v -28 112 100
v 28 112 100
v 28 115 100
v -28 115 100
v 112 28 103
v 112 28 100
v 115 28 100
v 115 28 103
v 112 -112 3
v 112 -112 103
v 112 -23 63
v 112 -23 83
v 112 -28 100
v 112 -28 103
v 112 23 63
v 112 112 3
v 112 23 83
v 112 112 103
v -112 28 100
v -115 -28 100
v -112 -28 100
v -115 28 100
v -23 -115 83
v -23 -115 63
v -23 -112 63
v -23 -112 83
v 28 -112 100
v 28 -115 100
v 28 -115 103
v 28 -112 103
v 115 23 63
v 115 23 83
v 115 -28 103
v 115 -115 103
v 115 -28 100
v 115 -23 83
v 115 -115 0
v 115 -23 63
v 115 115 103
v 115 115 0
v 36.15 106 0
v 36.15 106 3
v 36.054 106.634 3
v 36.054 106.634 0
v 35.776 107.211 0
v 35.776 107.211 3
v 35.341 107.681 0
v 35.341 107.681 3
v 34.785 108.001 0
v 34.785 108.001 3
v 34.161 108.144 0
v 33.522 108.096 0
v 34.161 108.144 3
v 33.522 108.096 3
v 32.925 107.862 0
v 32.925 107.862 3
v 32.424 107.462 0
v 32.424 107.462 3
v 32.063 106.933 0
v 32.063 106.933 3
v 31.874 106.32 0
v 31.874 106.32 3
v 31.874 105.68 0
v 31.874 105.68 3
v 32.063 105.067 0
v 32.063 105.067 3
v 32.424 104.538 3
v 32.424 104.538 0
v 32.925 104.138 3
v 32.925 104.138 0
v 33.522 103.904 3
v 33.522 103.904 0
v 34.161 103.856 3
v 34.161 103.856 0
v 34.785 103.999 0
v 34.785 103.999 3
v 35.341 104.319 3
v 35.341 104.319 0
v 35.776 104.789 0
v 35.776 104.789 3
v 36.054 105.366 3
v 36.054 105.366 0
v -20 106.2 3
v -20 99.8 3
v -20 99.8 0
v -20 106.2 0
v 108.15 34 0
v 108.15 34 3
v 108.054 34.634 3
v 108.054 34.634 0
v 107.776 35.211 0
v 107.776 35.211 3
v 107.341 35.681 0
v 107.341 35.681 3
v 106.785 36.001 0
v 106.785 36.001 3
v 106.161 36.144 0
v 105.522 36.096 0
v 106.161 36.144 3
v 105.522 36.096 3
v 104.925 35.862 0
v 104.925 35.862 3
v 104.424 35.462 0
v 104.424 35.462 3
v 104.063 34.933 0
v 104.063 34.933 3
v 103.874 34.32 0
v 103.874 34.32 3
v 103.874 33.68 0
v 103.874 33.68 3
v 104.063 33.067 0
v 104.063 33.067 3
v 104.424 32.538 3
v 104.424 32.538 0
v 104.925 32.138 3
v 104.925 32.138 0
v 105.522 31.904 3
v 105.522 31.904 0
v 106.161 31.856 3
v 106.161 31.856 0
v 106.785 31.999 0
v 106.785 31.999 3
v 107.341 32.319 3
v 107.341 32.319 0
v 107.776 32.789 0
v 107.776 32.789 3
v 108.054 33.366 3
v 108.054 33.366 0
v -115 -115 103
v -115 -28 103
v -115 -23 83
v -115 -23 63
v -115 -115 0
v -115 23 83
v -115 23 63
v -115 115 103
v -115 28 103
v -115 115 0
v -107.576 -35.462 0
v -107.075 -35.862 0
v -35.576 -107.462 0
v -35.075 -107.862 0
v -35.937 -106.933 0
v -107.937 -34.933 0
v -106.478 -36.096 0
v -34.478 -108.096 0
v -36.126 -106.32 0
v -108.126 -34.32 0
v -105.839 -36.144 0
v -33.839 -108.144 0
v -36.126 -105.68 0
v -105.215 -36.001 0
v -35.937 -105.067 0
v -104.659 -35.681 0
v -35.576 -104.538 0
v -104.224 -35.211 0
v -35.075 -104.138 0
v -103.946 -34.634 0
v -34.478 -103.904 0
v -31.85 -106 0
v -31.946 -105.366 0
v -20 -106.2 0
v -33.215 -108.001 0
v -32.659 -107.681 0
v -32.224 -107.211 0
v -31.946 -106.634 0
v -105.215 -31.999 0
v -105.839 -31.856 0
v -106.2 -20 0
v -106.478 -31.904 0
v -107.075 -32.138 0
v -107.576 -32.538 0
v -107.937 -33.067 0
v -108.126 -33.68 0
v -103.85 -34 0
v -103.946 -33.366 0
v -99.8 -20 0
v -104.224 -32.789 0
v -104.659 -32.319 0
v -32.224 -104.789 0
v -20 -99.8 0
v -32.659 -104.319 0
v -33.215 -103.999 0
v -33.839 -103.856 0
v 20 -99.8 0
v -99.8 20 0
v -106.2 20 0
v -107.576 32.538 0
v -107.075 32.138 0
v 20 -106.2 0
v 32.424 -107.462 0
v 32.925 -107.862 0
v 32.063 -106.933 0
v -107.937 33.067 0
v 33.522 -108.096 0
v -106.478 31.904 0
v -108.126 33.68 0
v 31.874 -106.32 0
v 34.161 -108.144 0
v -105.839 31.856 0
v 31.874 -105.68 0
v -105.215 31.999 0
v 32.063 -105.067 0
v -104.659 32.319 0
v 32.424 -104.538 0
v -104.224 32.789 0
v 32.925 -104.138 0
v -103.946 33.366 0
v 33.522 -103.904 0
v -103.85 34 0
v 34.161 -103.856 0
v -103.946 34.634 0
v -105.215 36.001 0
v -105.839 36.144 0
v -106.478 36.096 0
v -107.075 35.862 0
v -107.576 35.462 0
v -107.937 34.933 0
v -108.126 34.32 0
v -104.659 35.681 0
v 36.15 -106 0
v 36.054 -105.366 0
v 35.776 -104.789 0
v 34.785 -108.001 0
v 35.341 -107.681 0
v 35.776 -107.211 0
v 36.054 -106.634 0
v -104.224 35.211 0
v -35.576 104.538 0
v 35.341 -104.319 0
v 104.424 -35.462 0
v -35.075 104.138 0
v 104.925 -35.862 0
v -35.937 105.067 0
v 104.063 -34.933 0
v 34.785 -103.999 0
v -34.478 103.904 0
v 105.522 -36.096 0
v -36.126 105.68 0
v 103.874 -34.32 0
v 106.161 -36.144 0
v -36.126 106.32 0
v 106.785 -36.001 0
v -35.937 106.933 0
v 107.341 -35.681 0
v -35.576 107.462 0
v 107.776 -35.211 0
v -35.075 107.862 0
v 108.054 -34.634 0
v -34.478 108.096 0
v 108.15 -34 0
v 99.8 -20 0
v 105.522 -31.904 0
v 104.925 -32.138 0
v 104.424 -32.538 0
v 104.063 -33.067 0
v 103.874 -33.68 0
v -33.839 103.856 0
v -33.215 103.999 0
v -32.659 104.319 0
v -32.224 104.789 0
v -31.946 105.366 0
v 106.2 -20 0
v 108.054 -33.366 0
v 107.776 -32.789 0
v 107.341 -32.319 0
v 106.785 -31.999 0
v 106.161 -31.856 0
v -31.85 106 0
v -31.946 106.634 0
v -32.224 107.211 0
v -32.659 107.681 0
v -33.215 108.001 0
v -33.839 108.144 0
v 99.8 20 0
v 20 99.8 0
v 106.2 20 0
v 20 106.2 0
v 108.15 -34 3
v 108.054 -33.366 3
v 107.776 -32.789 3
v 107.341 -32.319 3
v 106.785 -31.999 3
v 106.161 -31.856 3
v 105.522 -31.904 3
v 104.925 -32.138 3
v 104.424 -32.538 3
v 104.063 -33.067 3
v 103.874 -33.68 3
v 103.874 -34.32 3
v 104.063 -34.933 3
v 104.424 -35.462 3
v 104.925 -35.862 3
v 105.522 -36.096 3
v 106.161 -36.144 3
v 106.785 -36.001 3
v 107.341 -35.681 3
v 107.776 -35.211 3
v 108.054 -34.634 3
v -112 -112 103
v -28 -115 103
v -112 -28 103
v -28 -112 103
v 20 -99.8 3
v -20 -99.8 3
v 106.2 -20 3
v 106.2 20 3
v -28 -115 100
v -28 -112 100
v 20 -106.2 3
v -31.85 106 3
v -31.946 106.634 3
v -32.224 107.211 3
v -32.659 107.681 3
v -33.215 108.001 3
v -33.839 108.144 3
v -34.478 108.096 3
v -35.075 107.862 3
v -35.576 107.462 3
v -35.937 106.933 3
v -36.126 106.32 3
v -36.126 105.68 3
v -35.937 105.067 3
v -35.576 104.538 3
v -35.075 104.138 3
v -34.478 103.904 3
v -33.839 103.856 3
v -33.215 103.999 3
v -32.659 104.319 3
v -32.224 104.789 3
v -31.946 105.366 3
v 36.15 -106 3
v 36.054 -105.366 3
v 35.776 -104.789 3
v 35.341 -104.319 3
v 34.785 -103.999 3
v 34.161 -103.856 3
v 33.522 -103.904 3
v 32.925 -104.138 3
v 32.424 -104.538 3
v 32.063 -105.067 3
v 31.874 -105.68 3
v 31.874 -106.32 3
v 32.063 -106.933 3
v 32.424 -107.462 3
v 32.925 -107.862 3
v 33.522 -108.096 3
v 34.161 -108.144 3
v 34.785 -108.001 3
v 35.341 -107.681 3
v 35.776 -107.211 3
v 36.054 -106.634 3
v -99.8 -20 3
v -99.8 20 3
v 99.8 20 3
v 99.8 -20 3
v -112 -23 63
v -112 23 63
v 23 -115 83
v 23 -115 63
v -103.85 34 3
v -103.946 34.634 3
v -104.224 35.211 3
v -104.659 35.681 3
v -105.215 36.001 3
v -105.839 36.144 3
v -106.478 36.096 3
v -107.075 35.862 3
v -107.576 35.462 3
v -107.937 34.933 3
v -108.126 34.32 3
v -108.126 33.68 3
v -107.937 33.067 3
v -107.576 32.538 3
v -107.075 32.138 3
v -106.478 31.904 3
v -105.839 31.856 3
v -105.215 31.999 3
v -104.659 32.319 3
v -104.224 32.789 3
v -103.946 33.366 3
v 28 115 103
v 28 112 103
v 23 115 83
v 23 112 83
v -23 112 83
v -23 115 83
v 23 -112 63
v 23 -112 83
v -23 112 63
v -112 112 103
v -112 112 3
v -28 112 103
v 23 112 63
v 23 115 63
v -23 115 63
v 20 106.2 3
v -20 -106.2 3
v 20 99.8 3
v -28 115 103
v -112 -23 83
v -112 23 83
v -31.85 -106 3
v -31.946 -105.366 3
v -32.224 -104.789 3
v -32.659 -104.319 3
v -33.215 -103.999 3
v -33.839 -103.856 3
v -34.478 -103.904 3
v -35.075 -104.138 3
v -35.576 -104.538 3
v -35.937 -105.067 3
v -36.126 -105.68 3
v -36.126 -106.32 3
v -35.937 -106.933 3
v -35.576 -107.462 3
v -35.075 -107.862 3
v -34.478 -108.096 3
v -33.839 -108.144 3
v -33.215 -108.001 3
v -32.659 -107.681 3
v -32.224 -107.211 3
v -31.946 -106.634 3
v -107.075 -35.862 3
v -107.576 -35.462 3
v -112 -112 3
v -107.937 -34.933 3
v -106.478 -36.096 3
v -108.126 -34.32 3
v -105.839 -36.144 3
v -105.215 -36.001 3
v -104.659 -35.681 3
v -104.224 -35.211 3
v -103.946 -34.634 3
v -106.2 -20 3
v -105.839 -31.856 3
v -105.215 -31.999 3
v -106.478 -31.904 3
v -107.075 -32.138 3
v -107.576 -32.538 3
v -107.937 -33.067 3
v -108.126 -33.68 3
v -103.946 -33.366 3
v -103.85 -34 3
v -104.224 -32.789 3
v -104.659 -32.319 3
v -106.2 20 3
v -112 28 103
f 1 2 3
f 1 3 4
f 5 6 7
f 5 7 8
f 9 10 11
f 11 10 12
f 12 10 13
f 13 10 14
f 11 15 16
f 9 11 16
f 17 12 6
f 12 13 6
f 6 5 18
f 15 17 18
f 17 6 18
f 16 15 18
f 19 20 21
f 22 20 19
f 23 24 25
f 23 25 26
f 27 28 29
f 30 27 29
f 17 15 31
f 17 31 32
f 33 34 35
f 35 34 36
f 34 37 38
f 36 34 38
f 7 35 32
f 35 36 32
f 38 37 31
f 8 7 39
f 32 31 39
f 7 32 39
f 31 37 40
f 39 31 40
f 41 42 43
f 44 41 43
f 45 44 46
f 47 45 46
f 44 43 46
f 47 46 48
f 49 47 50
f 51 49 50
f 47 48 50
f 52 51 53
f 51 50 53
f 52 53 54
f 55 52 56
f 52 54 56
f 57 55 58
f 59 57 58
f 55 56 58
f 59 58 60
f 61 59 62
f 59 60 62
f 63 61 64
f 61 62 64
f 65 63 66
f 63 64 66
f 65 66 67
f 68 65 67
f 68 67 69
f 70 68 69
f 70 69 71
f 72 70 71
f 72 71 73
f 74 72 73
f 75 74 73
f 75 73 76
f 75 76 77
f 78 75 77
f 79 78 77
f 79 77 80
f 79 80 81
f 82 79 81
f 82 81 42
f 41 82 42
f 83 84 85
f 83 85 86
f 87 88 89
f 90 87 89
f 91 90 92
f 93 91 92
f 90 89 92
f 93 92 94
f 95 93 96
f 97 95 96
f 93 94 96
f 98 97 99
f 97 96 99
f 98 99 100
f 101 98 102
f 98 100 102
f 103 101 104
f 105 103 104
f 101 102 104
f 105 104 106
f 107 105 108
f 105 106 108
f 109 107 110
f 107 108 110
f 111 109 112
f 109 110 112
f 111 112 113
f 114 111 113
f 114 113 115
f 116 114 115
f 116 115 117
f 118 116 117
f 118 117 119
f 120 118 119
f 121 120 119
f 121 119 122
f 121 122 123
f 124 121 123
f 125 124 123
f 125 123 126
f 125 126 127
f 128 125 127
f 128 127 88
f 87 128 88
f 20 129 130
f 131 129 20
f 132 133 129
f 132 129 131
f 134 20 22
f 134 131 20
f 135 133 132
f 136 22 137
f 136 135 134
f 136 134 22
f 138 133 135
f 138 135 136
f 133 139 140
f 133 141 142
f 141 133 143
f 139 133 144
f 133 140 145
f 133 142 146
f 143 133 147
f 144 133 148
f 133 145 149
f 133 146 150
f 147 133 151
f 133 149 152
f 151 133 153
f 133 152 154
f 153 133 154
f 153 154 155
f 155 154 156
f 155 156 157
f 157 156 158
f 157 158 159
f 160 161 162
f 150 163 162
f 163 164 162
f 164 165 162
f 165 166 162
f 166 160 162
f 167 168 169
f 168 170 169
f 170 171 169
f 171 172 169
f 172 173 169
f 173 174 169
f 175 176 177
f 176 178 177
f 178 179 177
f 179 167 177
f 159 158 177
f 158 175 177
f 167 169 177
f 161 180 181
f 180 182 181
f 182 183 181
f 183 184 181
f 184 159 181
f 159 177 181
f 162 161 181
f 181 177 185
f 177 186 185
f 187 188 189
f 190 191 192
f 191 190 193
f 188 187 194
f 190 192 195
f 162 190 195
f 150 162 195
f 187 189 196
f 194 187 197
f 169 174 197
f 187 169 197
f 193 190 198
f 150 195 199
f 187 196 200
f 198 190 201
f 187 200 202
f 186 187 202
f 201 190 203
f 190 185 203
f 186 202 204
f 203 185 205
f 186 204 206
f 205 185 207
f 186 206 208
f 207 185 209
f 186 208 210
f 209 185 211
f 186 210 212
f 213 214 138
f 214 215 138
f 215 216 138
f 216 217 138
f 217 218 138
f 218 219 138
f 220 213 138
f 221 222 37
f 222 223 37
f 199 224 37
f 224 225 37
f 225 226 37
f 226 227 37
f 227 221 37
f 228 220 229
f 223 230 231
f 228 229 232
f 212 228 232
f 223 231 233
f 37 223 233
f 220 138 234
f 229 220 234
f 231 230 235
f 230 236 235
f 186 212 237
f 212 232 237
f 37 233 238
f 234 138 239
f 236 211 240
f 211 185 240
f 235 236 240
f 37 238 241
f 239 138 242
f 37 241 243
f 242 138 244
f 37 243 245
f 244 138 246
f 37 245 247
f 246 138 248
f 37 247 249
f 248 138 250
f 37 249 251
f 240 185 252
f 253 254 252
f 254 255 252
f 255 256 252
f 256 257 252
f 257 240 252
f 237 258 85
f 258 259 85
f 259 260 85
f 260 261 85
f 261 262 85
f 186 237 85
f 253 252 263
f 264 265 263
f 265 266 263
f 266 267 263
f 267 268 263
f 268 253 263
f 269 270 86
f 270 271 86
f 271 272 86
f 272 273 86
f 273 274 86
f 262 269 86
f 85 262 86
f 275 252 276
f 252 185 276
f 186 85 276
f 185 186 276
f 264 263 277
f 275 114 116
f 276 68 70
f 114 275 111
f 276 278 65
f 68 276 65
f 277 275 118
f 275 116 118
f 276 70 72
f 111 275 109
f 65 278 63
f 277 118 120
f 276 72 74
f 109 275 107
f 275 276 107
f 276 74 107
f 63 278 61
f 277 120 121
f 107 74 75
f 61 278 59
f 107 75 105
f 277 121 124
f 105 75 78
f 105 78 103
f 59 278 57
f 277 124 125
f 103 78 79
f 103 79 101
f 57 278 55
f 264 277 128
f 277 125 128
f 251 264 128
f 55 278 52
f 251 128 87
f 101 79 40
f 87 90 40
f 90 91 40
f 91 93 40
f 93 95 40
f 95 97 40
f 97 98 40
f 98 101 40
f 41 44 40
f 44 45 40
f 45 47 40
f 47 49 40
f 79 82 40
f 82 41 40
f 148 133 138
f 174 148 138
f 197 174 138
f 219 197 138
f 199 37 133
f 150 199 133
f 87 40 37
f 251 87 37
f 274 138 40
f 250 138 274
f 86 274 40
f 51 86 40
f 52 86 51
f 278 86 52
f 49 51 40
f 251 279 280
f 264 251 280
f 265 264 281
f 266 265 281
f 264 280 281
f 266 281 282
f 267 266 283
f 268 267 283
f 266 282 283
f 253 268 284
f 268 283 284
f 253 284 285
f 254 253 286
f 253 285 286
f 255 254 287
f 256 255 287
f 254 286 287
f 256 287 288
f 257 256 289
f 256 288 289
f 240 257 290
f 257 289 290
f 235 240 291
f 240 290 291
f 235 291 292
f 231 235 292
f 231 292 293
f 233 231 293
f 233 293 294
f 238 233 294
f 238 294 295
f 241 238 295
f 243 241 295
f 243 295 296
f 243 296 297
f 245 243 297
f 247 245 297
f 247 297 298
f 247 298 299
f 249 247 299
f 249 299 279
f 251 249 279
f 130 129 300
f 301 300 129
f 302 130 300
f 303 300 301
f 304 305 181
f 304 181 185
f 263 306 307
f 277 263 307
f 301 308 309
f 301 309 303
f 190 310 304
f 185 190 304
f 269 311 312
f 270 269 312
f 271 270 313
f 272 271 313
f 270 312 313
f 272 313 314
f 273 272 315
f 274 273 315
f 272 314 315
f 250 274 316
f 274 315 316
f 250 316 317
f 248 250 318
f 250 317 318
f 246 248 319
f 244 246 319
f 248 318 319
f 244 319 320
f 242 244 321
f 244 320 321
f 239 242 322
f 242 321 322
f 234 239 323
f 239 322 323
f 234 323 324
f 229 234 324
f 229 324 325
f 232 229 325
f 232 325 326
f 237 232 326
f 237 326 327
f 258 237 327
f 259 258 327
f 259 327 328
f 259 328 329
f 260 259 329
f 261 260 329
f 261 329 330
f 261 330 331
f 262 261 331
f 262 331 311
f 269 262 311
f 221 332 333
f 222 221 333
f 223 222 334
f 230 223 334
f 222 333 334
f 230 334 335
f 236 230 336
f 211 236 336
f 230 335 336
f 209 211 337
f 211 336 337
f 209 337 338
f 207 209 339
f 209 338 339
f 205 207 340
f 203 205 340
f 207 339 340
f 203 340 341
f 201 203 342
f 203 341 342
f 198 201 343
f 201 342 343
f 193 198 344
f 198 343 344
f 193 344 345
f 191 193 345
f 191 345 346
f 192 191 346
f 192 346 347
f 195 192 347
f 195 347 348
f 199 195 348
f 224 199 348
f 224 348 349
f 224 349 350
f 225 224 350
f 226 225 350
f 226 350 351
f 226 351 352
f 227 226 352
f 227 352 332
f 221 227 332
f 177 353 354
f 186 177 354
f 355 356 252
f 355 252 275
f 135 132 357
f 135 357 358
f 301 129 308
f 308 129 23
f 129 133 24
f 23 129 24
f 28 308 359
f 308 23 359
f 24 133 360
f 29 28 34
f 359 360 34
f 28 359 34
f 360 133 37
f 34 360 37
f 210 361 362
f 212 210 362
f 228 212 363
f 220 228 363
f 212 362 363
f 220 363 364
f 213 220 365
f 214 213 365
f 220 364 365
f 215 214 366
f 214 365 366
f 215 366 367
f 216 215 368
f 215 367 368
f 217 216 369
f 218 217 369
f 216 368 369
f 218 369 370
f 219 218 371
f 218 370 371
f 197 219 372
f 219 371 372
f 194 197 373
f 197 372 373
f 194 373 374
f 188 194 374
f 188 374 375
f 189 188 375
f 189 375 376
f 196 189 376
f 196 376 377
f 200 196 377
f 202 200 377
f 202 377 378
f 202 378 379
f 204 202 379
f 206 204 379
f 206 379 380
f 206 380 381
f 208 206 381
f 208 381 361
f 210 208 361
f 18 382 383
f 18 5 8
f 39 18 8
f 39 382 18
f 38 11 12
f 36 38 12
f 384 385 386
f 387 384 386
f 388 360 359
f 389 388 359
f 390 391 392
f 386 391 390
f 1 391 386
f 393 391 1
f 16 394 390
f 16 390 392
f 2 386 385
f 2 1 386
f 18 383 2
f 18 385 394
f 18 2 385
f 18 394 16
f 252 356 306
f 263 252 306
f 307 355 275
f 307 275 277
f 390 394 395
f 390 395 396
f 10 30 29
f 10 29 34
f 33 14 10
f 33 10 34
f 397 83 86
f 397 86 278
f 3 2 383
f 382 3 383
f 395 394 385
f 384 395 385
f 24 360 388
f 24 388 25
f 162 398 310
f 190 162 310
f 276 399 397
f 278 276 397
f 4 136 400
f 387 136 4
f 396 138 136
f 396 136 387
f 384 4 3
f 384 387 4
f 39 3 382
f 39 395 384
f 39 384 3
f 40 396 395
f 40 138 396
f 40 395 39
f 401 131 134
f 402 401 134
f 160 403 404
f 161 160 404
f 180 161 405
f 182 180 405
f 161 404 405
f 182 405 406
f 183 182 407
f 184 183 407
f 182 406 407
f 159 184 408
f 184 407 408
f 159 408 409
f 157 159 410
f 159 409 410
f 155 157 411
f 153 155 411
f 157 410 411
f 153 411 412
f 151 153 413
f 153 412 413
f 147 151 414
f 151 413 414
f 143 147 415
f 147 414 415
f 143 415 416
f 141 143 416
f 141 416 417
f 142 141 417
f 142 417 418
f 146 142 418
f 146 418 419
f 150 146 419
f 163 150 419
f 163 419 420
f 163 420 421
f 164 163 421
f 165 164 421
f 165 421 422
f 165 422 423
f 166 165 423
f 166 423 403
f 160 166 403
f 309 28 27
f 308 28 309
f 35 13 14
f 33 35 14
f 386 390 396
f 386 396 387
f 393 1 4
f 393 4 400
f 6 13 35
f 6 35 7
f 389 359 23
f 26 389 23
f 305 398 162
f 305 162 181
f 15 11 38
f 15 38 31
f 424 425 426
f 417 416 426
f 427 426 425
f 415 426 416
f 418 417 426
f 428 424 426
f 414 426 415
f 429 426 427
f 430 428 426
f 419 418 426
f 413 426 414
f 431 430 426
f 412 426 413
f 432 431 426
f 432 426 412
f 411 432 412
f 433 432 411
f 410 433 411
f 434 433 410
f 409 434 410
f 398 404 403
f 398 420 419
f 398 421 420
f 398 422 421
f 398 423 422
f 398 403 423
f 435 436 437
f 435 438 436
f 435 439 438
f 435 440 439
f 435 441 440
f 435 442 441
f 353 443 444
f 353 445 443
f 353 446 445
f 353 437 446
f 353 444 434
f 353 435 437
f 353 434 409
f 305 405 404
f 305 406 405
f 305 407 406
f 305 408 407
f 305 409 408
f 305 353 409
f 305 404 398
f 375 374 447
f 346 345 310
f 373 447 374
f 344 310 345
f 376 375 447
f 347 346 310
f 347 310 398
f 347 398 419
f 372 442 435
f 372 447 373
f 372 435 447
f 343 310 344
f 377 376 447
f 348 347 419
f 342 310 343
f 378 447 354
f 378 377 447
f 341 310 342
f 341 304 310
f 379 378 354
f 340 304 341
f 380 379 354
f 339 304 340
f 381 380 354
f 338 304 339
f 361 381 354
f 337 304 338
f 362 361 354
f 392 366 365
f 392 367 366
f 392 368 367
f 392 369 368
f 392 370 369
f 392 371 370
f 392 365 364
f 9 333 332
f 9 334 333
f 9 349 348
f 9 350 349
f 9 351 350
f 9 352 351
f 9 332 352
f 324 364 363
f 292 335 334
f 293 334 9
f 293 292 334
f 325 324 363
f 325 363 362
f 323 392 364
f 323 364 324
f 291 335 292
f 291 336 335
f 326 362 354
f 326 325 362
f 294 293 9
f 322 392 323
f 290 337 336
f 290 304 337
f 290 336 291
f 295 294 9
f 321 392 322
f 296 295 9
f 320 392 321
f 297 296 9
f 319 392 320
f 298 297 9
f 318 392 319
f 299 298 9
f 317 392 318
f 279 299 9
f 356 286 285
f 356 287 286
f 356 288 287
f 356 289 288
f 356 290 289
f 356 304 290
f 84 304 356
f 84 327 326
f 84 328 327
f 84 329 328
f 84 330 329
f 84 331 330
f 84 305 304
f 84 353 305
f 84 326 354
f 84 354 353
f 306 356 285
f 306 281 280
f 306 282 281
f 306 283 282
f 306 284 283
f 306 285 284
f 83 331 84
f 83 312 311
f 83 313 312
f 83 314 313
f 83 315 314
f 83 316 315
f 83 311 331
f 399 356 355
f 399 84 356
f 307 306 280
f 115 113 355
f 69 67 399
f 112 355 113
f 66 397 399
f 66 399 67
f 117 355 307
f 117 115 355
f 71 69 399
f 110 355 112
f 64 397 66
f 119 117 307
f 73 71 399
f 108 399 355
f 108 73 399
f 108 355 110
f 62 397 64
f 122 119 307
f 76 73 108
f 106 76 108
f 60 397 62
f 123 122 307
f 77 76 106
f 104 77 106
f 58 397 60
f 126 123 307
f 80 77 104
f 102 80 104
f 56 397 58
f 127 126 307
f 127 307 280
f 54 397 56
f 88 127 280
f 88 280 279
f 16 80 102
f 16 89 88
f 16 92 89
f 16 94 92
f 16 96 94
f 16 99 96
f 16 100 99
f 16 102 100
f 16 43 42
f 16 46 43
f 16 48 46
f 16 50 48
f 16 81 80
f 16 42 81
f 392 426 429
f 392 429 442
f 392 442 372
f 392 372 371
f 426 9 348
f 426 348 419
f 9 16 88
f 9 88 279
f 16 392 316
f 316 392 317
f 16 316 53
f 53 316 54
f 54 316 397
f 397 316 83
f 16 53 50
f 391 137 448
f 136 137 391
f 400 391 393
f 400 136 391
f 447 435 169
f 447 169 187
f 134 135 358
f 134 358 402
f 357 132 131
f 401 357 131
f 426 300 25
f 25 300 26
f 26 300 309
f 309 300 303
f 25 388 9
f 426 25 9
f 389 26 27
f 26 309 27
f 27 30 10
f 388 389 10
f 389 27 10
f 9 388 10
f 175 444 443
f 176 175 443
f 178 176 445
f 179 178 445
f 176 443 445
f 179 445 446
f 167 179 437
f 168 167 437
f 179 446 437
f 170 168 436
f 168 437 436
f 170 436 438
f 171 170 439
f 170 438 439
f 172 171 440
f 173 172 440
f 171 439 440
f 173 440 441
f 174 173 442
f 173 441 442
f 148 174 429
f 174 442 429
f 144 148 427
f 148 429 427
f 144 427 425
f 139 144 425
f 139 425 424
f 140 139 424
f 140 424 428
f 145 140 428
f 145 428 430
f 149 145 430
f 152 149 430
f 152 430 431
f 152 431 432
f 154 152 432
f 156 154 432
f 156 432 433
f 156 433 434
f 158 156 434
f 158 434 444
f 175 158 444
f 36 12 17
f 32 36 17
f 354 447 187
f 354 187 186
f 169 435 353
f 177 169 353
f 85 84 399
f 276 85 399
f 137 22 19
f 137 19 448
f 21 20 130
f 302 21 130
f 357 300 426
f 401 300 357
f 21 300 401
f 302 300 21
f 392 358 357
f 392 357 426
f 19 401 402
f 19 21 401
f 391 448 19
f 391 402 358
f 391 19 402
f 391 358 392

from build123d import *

# Parameters (mm, degrees)
SKETCH_1_W               = 230
SKETCH_1_H               = 230
EXTRUDE_1_DEPTH          = 3
SKETCH_3_W               = 230
SKETCH_3_H               = 230
EXTRUDE_3_DEPTH          = 100
SKETCH_4_W               = 220
SKETCH_4_H               = 220
CUT_EXTRUDE_1_DEPTH      = 100
SKETCH_6_W               = 20
SKETCH_6_H               = 46
CUT_EXTRUDE_3_DEPTH      = 278.009025124
PATTERN_CIRCULAR_1_COUNT = 2
PATTERN_CIRCULAR_1_ANGLE = 90
SKETCH_11_W              = 224
SKETCH_11_H              = 224
CUT_EXTRUDE_5_DEPTH      = 100
SKETCH_13_W              = 3
SKETCH_13_H              = 56
CUT_EXTRUDE_7_DEPTH      = 278.009025124
SKETCH_14_R              = 2.15
SKETCH_14_W              = 6.4
SKETCH_14_H              = 40
SKETCH_14_W_2            = 40
SKETCH_14_H_2            = 6.4
CUT_EXTRUDE_8_DEPTH      = 191.91883092
PATTERN_CIRCULAR_2_COUNT = 2
PATTERN_CIRCULAR_2_ANGLE = 90


with BuildPart() as part:
    # 스케치1 → 보스-돌출1 (new body)
    with BuildSketch(Plane.XY):
        Rectangle(SKETCH_1_W, SKETCH_1_H)
    extrude(amount=EXTRUDE_1_DEPTH)

    # 스케치3 → 보스-돌출3 (add)
    with BuildSketch(Plane.XY.offset(3)):
        Rectangle(SKETCH_3_W, SKETCH_3_H)
    extrude(amount=EXTRUDE_3_DEPTH)

    # 스케치4 → 컷-돌출1 (cut)
    with BuildSketch(Plane.XY.offset(103)):
        Rectangle(SKETCH_4_W, SKETCH_4_H)
    extrude(amount=-CUT_EXTRUDE_1_DEPTH, mode=Mode.SUBTRACT)

    # 스케치6 → 컷-돌출3 (cut, through all)
    with BuildSketch(Plane.ZY.offset(115)):
        with Locations((73, 0)):
            Rectangle(SKETCH_6_W, SKETCH_6_H)
    cut_extrude_3 = extrude(amount=-CUT_EXTRUDE_3_DEPTH, mode=Mode.SUBTRACT)

    # 원형 패턴1: 컷-돌출3 ×2 about axis
    pattern_circular_1_axis = Axis((0, 0, 0), (0, 0, 1))
    for i in range(1, PATTERN_CIRCULAR_1_COUNT):
        add(cut_extrude_3.rotate(pattern_circular_1_axis, i * PATTERN_CIRCULAR_1_ANGLE / (PATTERN_CIRCULAR_1_COUNT - 1)), mode=Mode.SUBTRACT)

    # 스케치11 → 컷-돌출5 (cut)
    with BuildSketch(Plane.XY.offset(103)):
        Rectangle(SKETCH_11_W, SKETCH_11_H)
    extrude(amount=-CUT_EXTRUDE_5_DEPTH, mode=Mode.SUBTRACT)

    # 스케치13 → 컷-돌출7 (cut, through all)
    with BuildSketch(Plane.ZY.offset(115)):
        with Locations((101.5, 0)):
            Rectangle(SKETCH_13_W, SKETCH_13_H)
    cut_extrude_7 = extrude(amount=-CUT_EXTRUDE_7_DEPTH, mode=Mode.SUBTRACT)

    # 스케치14 → 컷-돌출8 (cut, through all)
    with BuildSketch(Plane.XY.offset(3)):
        with Locations((-106, -34)):
            Circle(SKETCH_14_R)
        with Locations((-106, 34)):
            Circle(SKETCH_14_R)
        with Locations((-34, 106)):
            Circle(SKETCH_14_R)
        with Locations((34, 106)):
            Circle(SKETCH_14_R)
        with Locations((106, 34)):
            Circle(SKETCH_14_R)
        with Locations((106, -34)):
            Circle(SKETCH_14_R)
        with Locations((34, -106)):
            Circle(SKETCH_14_R)
        with Locations((-34, -106)):
            Circle(SKETCH_14_R)
        with Locations((-103, 0)):
            Rectangle(SKETCH_14_W, SKETCH_14_H)
        with Locations((0, 103)):
            Rectangle(SKETCH_14_W_2, SKETCH_14_H_2)
        with Locations((103, 0)):
            Rectangle(SKETCH_14_W, SKETCH_14_H)
        with Locations((0, -103)):
            Rectangle(SKETCH_14_W_2, SKETCH_14_H_2)
    extrude(amount=-CUT_EXTRUDE_8_DEPTH, mode=Mode.SUBTRACT)

    # 원형 패턴2: 컷-돌출7 ×2 about axis
    pattern_circular_2_axis = Axis((0, 0, -18.105724747), (0, 0, 1))
    for i in range(1, PATTERN_CIRCULAR_2_COUNT):
        add(cut_extrude_7.rotate(pattern_circular_2_axis, i * PATTERN_CIRCULAR_2_ANGLE / (PATTERN_CIRCULAR_2_COUNT - 1)), mode=Mode.SUBTRACT)


solid = part.part
